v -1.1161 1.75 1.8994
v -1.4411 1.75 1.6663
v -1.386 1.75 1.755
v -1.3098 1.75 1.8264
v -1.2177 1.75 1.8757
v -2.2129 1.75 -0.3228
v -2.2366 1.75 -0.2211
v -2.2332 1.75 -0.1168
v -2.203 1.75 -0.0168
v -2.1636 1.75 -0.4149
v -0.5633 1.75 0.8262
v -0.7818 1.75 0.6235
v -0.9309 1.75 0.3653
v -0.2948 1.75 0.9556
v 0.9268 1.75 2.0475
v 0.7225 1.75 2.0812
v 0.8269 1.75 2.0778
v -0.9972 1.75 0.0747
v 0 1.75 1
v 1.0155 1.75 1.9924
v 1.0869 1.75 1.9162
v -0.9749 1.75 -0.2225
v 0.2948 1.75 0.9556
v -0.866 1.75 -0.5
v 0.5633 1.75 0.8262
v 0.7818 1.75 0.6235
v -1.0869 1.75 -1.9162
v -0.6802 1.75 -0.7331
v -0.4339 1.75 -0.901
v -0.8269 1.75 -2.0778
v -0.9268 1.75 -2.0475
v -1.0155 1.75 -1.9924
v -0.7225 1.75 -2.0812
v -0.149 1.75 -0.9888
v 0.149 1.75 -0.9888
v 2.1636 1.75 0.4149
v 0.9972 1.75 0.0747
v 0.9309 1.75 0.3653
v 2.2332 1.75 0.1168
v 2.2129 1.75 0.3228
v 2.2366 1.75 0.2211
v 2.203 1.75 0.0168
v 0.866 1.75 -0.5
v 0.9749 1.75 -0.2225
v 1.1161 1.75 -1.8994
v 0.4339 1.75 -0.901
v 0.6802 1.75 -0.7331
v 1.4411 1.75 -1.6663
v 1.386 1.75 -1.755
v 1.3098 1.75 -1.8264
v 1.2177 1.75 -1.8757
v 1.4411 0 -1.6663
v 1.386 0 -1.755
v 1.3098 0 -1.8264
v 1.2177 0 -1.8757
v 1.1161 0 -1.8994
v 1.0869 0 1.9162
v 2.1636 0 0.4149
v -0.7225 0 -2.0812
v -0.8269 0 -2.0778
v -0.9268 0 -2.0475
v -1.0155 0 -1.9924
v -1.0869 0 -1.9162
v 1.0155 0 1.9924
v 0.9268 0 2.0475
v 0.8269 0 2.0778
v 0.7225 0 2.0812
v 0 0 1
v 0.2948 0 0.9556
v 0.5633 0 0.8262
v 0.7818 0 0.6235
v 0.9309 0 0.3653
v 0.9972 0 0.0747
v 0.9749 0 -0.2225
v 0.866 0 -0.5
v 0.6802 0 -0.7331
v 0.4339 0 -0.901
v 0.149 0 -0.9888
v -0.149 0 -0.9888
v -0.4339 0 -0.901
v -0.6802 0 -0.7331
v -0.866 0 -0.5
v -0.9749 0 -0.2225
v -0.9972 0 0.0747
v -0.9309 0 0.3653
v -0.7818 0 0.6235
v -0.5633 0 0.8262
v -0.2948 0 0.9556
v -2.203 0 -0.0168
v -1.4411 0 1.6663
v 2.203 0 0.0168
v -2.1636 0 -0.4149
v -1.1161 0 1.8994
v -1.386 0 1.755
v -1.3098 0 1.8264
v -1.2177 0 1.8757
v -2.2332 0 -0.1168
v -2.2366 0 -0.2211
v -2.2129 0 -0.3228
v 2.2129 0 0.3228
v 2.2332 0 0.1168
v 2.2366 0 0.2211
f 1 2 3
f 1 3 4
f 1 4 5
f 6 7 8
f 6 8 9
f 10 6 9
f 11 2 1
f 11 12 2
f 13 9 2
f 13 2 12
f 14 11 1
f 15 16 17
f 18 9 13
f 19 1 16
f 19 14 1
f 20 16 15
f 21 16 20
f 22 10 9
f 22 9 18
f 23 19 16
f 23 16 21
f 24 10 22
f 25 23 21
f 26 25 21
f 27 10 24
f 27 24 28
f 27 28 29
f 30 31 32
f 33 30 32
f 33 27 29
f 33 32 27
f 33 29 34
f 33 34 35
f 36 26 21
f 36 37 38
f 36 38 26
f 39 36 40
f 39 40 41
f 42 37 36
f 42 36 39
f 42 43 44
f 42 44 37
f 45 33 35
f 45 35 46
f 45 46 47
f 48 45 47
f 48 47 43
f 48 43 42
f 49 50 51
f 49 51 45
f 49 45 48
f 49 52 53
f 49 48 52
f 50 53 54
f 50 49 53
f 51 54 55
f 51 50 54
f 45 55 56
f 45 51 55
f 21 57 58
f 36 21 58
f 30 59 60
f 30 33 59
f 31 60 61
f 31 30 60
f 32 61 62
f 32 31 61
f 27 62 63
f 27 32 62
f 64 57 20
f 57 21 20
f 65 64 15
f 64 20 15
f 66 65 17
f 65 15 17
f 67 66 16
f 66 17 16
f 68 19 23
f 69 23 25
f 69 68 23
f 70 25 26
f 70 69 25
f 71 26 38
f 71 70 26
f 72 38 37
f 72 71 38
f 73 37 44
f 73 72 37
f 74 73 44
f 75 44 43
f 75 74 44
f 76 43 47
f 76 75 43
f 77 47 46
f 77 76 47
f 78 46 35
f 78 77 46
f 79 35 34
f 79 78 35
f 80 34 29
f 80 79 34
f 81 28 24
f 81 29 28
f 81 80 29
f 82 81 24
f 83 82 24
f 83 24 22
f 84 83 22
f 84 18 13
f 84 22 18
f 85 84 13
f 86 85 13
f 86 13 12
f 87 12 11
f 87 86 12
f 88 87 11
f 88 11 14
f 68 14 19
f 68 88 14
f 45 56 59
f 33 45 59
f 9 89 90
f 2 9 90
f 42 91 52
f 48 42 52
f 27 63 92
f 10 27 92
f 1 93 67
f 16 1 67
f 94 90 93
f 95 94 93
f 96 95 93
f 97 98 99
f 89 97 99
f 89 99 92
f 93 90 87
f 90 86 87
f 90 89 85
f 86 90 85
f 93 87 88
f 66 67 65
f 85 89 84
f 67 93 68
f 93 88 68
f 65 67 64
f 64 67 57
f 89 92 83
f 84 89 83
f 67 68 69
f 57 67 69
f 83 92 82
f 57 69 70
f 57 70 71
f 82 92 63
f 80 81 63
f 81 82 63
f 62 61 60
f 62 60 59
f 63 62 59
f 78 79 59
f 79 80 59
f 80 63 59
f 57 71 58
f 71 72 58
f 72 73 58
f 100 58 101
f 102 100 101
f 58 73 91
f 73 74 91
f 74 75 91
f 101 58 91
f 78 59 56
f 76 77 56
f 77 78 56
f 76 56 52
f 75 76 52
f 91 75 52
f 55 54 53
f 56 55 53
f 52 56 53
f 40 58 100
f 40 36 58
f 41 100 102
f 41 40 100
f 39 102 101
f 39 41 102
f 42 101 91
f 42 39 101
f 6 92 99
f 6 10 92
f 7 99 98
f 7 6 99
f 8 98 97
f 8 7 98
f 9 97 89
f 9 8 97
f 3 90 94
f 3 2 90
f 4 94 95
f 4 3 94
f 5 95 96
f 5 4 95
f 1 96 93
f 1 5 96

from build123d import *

# Parameters (mm, degrees)
BOSS_EXTRUDE1_DEPTH = 1.75
FILLET1_R           = 0.4
SKETCH7_R           = 1
CUT_EXTRUDE1_DEPTH  = 4.523215893


with BuildPart() as part:
    # Sketch1 → Boss-Extrude1 (new body)
    with BuildSketch(Plane(origin=(0, 0, 0), x_dir=(1, 0, 0), z_dir=(0, 1, 0))):
        Polygon((0.952315216, -2.103908045), (2.298195422, -0.227224853), (1.345880206, 1.876683192), (-0.952315216, 2.103908045), (-2.298195422, 0.227224853), (-1.345880206, -1.876683192), align=None)
    extrude(amount=BOSS_EXTRUDE1_DEPTH)

    # Fillet1
    fillet1_edges = [part.edges().sort_by_distance(p)[0] for p in [
        (-1.345880206, 0.875, 1.876683192),
        (-2.298195422, 0.875, -0.227224853),
        (-0.952315216, 0.875, -2.103908045),
        (1.345880206, 0.875, -1.876683192),
        (2.298195422, 0.875, 0.227224853),
        (0.952315216, 0.875, 2.103908045),
    ]]
    fillet(fillet1_edges, radius=FILLET1_R)

    # Sketch7 → Cut-Extrude1 (cut, through all)
    with BuildSketch(Plane(origin=(0, 0, 0), x_dir=(1, 0, 0), z_dir=(0, 1, 0))):
        with Locations(Location((0, 0, 0), (0, 0, 270))):
            Circle(SKETCH7_R)
    extrude(amount=CUT_EXTRUDE1_DEPTH, mode=Mode.SUBTRACT)


solid = part.part
